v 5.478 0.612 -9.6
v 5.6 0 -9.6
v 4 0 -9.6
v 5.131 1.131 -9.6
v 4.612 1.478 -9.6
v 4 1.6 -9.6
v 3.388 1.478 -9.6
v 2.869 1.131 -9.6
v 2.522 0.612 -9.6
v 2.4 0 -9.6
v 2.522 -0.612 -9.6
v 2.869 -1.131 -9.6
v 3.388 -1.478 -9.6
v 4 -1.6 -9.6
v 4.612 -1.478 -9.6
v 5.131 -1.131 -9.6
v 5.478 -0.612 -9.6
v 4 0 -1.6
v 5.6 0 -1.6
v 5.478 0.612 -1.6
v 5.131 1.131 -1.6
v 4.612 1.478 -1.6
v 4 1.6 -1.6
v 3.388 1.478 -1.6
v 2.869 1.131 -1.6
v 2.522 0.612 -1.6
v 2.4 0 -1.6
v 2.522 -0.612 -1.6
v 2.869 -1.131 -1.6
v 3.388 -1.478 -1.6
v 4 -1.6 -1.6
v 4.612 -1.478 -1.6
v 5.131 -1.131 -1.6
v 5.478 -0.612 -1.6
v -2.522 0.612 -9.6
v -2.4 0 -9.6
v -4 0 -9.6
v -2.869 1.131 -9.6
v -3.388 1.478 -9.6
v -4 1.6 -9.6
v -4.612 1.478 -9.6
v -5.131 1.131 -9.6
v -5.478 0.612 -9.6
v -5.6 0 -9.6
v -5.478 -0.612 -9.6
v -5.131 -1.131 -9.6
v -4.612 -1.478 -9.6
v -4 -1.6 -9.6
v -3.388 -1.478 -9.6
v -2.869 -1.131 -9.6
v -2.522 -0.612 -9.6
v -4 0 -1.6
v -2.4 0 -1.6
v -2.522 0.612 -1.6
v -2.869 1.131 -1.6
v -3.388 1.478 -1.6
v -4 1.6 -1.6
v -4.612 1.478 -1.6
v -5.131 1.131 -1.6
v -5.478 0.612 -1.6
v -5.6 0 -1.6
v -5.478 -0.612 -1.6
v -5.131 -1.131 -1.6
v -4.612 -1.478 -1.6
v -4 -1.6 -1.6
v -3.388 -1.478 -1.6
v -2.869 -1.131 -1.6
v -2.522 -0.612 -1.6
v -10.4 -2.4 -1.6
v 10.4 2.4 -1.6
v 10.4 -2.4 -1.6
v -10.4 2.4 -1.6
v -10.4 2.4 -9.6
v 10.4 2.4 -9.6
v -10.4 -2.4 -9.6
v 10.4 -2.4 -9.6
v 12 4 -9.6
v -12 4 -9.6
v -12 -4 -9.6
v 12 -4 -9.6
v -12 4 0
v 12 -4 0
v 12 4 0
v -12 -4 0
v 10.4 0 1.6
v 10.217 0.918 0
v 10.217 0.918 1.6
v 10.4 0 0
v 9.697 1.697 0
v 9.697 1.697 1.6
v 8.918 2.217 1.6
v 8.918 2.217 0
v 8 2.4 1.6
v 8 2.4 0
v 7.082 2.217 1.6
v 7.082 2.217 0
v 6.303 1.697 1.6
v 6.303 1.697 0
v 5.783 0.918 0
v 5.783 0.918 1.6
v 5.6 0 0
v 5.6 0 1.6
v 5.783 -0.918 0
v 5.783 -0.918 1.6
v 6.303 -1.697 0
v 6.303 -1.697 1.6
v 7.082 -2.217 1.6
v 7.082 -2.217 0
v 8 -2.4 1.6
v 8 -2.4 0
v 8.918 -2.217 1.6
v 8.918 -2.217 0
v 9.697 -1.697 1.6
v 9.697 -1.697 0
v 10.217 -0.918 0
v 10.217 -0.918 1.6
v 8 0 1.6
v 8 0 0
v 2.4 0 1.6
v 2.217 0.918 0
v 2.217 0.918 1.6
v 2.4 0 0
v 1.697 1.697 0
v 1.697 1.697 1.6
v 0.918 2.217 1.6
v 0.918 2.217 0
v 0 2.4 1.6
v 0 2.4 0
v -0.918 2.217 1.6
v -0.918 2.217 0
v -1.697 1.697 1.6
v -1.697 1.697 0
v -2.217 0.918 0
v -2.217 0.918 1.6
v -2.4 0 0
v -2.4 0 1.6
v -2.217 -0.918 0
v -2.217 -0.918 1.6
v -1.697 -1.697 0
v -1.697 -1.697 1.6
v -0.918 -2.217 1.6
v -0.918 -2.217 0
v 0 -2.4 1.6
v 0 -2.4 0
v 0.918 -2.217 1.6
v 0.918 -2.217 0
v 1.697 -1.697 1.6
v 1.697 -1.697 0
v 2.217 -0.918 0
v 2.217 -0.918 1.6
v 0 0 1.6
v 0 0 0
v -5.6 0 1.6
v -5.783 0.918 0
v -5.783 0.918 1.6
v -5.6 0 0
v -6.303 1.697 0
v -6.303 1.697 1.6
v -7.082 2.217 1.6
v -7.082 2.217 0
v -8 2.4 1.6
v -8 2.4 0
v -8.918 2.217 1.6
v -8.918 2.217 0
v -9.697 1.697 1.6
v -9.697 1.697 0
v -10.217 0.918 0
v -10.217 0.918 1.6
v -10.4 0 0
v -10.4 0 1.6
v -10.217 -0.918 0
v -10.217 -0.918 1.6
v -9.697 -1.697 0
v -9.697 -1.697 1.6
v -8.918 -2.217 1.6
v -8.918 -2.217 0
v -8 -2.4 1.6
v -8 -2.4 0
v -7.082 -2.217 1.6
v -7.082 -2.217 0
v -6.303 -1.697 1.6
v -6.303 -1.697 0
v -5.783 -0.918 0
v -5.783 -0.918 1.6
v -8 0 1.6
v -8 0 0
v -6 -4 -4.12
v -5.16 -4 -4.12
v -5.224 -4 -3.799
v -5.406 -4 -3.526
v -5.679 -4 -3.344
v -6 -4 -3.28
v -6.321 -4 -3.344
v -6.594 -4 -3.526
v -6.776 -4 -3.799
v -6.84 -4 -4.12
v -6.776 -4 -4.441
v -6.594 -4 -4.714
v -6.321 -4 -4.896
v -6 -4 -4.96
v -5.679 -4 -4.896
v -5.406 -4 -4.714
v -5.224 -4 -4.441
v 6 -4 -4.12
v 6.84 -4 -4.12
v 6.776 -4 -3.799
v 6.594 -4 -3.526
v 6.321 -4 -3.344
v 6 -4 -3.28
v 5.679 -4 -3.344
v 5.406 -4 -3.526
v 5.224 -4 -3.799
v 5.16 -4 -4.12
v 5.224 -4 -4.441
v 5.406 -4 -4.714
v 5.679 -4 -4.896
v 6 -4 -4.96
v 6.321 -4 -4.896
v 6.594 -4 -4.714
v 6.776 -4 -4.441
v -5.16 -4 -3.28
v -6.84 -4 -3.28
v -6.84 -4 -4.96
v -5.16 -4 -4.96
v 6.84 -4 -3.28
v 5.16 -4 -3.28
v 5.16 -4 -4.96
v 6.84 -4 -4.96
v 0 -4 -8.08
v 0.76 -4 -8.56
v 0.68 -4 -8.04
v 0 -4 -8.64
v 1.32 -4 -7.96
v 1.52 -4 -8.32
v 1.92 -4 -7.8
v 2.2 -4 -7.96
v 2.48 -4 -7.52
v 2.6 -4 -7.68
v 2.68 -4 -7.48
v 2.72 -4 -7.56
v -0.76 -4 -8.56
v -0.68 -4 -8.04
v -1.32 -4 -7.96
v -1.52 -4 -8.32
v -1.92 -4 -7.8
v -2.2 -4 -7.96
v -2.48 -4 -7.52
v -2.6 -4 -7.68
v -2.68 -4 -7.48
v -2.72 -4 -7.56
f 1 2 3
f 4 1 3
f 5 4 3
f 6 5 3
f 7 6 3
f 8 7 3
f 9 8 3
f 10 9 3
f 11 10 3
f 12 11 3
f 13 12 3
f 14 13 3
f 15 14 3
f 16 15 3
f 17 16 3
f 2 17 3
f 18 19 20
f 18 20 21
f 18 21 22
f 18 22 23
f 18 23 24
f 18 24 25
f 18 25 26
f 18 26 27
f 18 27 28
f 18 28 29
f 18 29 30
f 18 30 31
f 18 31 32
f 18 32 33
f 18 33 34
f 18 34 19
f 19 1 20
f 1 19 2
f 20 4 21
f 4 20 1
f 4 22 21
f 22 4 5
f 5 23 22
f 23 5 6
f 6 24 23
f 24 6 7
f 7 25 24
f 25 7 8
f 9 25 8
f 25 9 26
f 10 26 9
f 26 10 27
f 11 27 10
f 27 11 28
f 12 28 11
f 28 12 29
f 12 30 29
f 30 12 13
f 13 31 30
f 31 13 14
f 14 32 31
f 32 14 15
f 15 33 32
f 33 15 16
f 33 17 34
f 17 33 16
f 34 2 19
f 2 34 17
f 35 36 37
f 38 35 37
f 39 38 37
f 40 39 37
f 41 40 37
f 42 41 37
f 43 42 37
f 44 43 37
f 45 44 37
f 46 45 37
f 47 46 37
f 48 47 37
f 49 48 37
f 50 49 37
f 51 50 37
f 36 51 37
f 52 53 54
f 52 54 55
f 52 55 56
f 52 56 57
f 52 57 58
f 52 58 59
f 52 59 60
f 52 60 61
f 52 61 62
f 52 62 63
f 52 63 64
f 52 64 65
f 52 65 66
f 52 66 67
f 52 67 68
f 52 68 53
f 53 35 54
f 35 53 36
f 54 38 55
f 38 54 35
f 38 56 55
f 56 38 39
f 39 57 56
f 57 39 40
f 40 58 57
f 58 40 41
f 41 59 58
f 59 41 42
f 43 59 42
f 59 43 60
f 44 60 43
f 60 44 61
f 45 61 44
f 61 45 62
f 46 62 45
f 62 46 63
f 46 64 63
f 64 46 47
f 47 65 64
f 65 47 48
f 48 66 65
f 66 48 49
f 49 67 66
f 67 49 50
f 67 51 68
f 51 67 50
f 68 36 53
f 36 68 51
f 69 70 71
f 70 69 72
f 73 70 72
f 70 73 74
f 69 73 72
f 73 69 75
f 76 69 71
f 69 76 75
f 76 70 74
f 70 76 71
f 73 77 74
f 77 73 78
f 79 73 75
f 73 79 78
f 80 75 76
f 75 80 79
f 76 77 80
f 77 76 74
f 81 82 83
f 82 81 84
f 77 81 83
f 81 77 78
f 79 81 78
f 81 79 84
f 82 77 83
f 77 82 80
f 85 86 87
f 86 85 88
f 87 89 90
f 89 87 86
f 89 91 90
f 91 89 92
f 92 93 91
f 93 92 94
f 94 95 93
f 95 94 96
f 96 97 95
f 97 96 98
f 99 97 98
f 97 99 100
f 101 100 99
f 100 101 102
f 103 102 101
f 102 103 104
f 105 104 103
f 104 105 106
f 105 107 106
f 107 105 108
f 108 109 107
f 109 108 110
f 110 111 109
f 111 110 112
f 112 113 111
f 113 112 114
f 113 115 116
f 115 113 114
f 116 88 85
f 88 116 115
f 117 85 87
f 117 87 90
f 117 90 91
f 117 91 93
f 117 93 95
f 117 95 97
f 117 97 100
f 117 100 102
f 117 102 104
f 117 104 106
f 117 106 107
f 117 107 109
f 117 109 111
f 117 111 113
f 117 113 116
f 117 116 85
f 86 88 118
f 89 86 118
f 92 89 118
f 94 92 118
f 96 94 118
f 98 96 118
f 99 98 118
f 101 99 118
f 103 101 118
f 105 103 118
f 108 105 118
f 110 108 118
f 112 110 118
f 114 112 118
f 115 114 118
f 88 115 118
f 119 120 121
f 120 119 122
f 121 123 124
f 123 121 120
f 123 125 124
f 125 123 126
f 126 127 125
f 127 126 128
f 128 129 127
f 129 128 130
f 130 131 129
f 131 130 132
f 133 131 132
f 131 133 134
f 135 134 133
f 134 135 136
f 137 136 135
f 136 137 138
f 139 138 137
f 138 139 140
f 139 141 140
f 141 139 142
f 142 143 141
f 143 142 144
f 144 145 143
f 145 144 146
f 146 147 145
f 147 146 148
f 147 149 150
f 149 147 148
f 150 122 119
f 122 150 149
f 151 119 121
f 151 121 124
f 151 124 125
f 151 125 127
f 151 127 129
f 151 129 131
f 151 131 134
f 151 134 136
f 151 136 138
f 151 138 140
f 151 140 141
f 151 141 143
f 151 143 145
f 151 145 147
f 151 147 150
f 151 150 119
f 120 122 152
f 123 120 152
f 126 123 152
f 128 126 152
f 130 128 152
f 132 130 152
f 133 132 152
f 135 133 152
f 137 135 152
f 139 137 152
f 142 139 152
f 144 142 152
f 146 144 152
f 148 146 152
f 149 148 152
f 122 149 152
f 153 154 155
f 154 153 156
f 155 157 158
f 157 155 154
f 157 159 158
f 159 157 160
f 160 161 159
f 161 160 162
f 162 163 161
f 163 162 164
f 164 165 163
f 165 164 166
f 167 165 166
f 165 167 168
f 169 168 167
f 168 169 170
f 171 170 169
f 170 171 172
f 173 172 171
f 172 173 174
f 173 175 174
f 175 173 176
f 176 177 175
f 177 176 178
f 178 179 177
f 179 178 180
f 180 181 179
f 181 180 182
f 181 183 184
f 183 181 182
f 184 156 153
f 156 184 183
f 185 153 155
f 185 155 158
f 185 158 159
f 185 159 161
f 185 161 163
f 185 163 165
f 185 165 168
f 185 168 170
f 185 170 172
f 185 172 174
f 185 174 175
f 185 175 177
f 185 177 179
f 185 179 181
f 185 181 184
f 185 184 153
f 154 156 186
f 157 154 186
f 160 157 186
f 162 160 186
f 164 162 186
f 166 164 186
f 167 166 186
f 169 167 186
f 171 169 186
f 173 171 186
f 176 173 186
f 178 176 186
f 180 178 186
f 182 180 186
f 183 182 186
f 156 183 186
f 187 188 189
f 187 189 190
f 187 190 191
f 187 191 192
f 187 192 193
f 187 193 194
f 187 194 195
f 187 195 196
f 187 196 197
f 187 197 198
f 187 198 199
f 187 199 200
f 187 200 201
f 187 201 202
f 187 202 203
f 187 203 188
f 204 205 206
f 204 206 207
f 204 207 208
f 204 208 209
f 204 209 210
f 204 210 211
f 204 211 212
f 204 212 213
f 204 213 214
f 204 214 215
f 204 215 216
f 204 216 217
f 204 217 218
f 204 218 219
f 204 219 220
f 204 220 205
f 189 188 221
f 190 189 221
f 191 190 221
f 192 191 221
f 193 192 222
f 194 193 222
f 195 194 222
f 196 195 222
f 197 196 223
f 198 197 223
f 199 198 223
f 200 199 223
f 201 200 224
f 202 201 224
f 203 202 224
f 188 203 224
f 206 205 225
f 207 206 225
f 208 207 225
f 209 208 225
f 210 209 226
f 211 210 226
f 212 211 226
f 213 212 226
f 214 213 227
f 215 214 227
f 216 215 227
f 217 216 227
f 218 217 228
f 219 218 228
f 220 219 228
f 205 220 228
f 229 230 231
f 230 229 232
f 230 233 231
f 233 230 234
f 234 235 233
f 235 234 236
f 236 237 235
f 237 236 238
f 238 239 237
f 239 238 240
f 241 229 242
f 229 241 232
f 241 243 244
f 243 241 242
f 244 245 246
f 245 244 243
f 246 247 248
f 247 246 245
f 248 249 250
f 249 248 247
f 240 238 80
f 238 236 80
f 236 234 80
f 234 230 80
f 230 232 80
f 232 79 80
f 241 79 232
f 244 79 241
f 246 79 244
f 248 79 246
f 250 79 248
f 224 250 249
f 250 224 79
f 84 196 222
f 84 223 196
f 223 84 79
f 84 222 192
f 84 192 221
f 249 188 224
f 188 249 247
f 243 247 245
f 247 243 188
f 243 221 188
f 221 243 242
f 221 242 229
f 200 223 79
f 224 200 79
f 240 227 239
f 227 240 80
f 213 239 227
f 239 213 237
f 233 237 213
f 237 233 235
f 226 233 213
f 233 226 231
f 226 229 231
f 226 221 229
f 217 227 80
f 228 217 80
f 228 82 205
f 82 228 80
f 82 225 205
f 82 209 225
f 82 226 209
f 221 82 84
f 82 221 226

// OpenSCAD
// file: ../p/4-4edge.scad
use <../lib.scad>
function ldraw_lib__4_4edge() = [
// 0 Circle 1.0
// 0 Name: 4-4edge.dat
// 0 Author: James Jessiman
// 0 !LDRAW_ORG Primitive UPDATE 2017-01
// 0 !LICENSE Licensed under CC BY 2.0 and CC BY 4.0 : see CAreadme.txt
// 
// 0 BFC CERTIFY CCW
  [0,"BFC","CERTIFY"],
  [0,"BFC","CCW"],
// 
// 0 !HISTORY 1998-12-15 [PTadmin] Official Update 1998-10
// 0 !HISTORY 2005-12-28 [PTadmin] Official Update 2005-01
// 0 !HISTORY 2007-06-24 [PTadmin] Header formatted for Contributor Agreement
// 0 !HISTORY 2008-07-01 [PTadmin] Official Update 2008-01
// 0 !HISTORY 2017-01-15 [Steffen] BFCed
// 0 !HISTORY 2017-12-30 [PTadmin] Official Update 2017-01
// 
// 
// 2 24 1 0 0 0.9239 0 0.3827
  [2,24,1,0,0,0.9239,0,0.3827],
// 2 24 0.9239 0 0.3827 0.7071 0 0.7071
  [2,24,0.9239,0,0.3827,0.7071,0,0.7071],
// 2 24 0.7071 0 0.7071 0.3827 0 0.9239
  [2,24,0.7071,0,0.7071,0.3827,0,0.9239],
// 2 24 0.3827 0 0.9239 0 0 1
  [2,24,0.3827,0,0.9239,0,0,1],
// 2 24 0 0 1 -0.3827 0 0.9239
  [2,24,0,0,1,-0.3827,0,0.9239],
// 2 24 -0.3827 0 0.9239 -0.7071 0 0.7071
  [2,24,-0.3827,0,0.9239,-0.7071,0,0.7071],
// 2 24 -0.7071 0 0.7071 -0.9239 0 0.3827
  [2,24,-0.7071,0,0.7071,-0.9239,0,0.3827],
// 2 24 -0.9239 0 0.3827 -1 0 -0
  [2,24,-0.9239,0,0.3827,-1,0,-0],
// 2 24 -1 0 -0 -0.9239 0 -0.3827
  [2,24,-1,0,-0,-0.9239,0,-0.3827],
// 2 24 -0.9239 0 -0.3827 -0.7071 0 -0.7071
  [2,24,-0.9239,0,-0.3827,-0.7071,0,-0.7071],
// 2 24 -0.7071 0 -0.7071 -0.3827 0 -0.9239
  [2,24,-0.7071,0,-0.7071,-0.3827,0,-0.9239],
// 2 24 -0.3827 0 -0.9239 0 0 -1
  [2,24,-0.3827,0,-0.9239,0,0,-1],
// 2 24 0 0 -1 0.3827 0 -0.9239
  [2,24,0,0,-1,0.3827,0,-0.9239],
// 2 24 0.3827 0 -0.9239 0.7071 0 -0.7071
  [2,24,0.3827,0,-0.9239,0.7071,0,-0.7071],
// 2 24 0.7071 0 -0.7071 0.9239 0 -0.3827
  [2,24,0.7071,0,-0.7071,0.9239,0,-0.3827],
// 2 24 0.9239 0 -0.3827 1 0 0
  [2,24,0.9239,0,-0.3827,1,0,0],
];
module ldraw_lib__4_4edge(step=0, col=false, unit=2/5, alt=false, line=0.2, solid=!$preview)
    makepoly(ldraw_lib__4_4edge(), step=step, col=col, unit=unit, alt=alt, line=line, solid=solid);
ldraw_lib__4_4edge(line=0.2);
// file: ../p/4-4cyli.scad
use <../lib.scad>
$fa=1; $fs=0.2;
function ldraw_lib__4_4cyli(realsolid=false) = [
// 0 Cylinder 1.0
// 0 Name: 4-4cyli.dat
// 0 Author: James Jessiman
// 0 !LDRAW_ORG Primitive UPDATE 2005-01
// 0 !LICENSE Licensed under CC BY 2.0 and CC BY 4.0 : see CAreadme.txt
// 
// 0 BFC CERTIFY CCW
  [0,"BFC","CERTIFY"],
  [0,"BFC","CCW"],
// 
// 0 !HISTORY 1998-12-15 [PTadmin] Official Update 1998-10
// 0 !HISTORY 2002-03-23 [sbliss] Added BFC statement; merged headers from files in distributions LDraw 0.27 and Complete.
// 0 !HISTORY 2002-04-25 [PTadmin] Official Update 2002-02
// 0 !HISTORY 2004-12-14 [guyvivan] BFC CCW
// 0 !HISTORY 2005-12-28 [PTadmin] Official Update 2005-01
// 0 !HISTORY 2007-06-24 [PTadmin] Header formatted for Contributor Agreement
// 0 !HISTORY 2008-07-01 [PTadmin] Official Update 2008-01
// 
// 
// 4 16 1 1 0 0.9239 1 0.3827 0.9239 0 0.3827 1 0 0
  [4,16,1,1,0,0.9239,1,0.3827,0.9239,0,0.3827,1,0,0],
// 5 24 1 0 0 1 1 0 0.9239 0 0.3827 0.9239 0 -0.3827
  [5,24,1,0,0,1,1,0,0.9239,0,0.3827,0.9239,0,-0.3827],
// 4 16 0.9239 1 0.3827 0.7071 1 0.7071 0.7071 0 0.7071 0.9239 0 0.3827
  [4,16,0.9239,1,0.3827,0.7071,1,0.7071,0.7071,0,0.7071,0.9239,0,0.3827],
// 5 24 0.9239 0 0.3827 0.9239 1 0.3827 0.7071 0 0.7071 1 0 0
  [5,24,0.9239,0,0.3827,0.9239,1,0.3827,0.7071,0,0.7071,1,0,0],
// 4 16 0.7071 1 0.7071 0.3827 1 0.9239 0.3827 0 0.9239 0.7071 0 0.7071
  [4,16,0.7071,1,0.7071,0.3827,1,0.9239,0.3827,0,0.9239,0.7071,0,0.7071],
// 5 24 0.7071 0 0.7071 0.7071 1 0.7071 0.3827 0 0.9239 0.9239 0 0.3827
  [5,24,0.7071,0,0.7071,0.7071,1,0.7071,0.3827,0,0.9239,0.9239,0,0.3827],
// 4 16 0.3827 1 0.9239 0 1 1 0 0 1 0.3827 0 0.9239
  [4,16,0.3827,1,0.9239,0,1,1,0,0,1,0.3827,0,0.9239],
// 5 24 0.3827 0 0.9239 0.3827 1 0.9239 0 0 1 0.7071 0 0.7071
  [5,24,0.3827,0,0.9239,0.3827,1,0.9239,0,0,1,0.7071,0,0.7071],
// 4 16 0 1 1 -0.3827 1 0.9239 -0.3827 0 0.9239 0 0 1
  [4,16,0,1,1,-0.3827,1,0.9239,-0.3827,0,0.9239,0,0,1],
// 5 24 0 0 1 0 1 1 -0.3827 0 0.9239 0.3827 0 0.9239
  [5,24,0,0,1,0,1,1,-0.3827,0,0.9239,0.3827,0,0.9239],
// 4 16 -0.3827 1 0.9239 -0.7071 1 0.7071 -0.7071 0 0.7071 -0.3827 0 0.9239
  [4,16,-0.3827,1,0.9239,-0.7071,1,0.7071,-0.7071,0,0.7071,-0.3827,0,0.9239],
// 5 24 -0.3827 0 0.9239 -0.3827 1 0.9239 -0.7071 0 0.7071 0 0 1
  [5,24,-0.3827,0,0.9239,-0.3827,1,0.9239,-0.7071,0,0.7071,0,0,1],
// 4 16 -0.7071 1 0.7071 -0.9239 1 0.3827 -0.9239 0 0.3827 -0.7071 0 0.7071
  [4,16,-0.7071,1,0.7071,-0.9239,1,0.3827,-0.9239,0,0.3827,-0.7071,0,0.7071],
// 5 24 -0.7071 0 0.7071 -0.7071 1 0.7071 -0.9239 0 0.3827 -0.3827 0 0.9239
  [5,24,-0.7071,0,0.7071,-0.7071,1,0.7071,-0.9239,0,0.3827,-0.3827,0,0.9239],
// 4 16 -0.9239 1 0.3827 -1 1 0 -1 0 0 -0.9239 0 0.3827
  [4,16,-0.9239,1,0.3827,-1,1,0,-1,0,0,-0.9239,0,0.3827],
// 5 24 -0.9239 0 0.3827 -0.9239 1 0.3827 -1 0 0 -0.7071 0 0.7071
  [5,24,-0.9239,0,0.3827,-0.9239,1,0.3827,-1,0,0,-0.7071,0,0.7071],
// 4 16 -1 1 0 -0.9239 1 -0.3827 -0.9239 0 -0.3827 -1 0 0
  [4,16,-1,1,0,-0.9239,1,-0.3827,-0.9239,0,-0.3827,-1,0,0],
// 5 24 -1 0 0 -1 1 0 -0.9239 0 -0.3827 -0.9239 0 0.3827
  [5,24,-1,0,0,-1,1,0,-0.9239,0,-0.3827,-0.9239,0,0.3827],
// 4 16 -0.9239 1 -0.3827 -0.7071 1 -0.7071 -0.7071 0 -0.7071 -0.9239 0 -0.3827
  [4,16,-0.9239,1,-0.3827,-0.7071,1,-0.7071,-0.7071,0,-0.7071,-0.9239,0,-0.3827],
// 5 24 -0.9239 0 -0.3827 -0.9239 1 -0.3827 -0.7071 0 -0.7071 -1 0 0
  [5,24,-0.9239,0,-0.3827,-0.9239,1,-0.3827,-0.7071,0,-0.7071,-1,0,0],
// 4 16 -0.7071 1 -0.7071 -0.3827 1 -0.9239 -0.3827 0 -0.9239 -0.7071 0 -0.7071
  [4,16,-0.7071,1,-0.7071,-0.3827,1,-0.9239,-0.3827,0,-0.9239,-0.7071,0,-0.7071],
// 5 24 -0.7071 0 -0.7071 -0.7071 1 -0.7071 -0.3827 0 -0.9239 -0.9239 0 -0.3827
  [5,24,-0.7071,0,-0.7071,-0.7071,1,-0.7071,-0.3827,0,-0.9239,-0.9239,0,-0.3827],
// 4 16 -0.3827 1 -0.9239 0 1 -1 0 0 -1 -0.3827 0 -0.9239
  [4,16,-0.3827,1,-0.9239,0,1,-1,0,0,-1,-0.3827,0,-0.9239],
// 5 24 -0.3827 0 -0.9239 -0.3827 1 -0.9239 0 0 -1 -0.7071 0 -0.7071
  [5,24,-0.3827,0,-0.9239,-0.3827,1,-0.9239,0,0,-1,-0.7071,0,-0.7071],
// 4 16 0 1 -1 0.3827 1 -0.9239 0.3827 0 -0.9239 0 0 -1
  [4,16,0,1,-1,0.3827,1,-0.9239,0.3827,0,-0.9239,0,0,-1],
// 5 24 0 0 -1 0 1 -1 0.3827 0 -0.9239 -0.3827 0 -0.9239
  [5,24,0,0,-1,0,1,-1,0.3827,0,-0.9239,-0.3827,0,-0.9239],
// 4 16 0.3827 1 -0.9239 0.7071 1 -0.7071 0.7071 0 -0.7071 0.3827 0 -0.9239
  [4,16,0.3827,1,-0.9239,0.7071,1,-0.7071,0.7071,0,-0.7071,0.3827,0,-0.9239],
// 5 24 0.3827 0 -0.9239 0.3827 1 -0.9239 0.7071 0 -0.7071 0 0 -1
  [5,24,0.3827,0,-0.9239,0.3827,1,-0.9239,0.7071,0,-0.7071,0,0,-1],
// 4 16 0.7071 1 -0.7071 0.9239 1 -0.3827 0.9239 0 -0.3827 0.7071 0 -0.7071
  [4,16,0.7071,1,-0.7071,0.9239,1,-0.3827,0.9239,0,-0.3827,0.7071,0,-0.7071],
// 5 24 0.7071 0 -0.7071 0.7071 1 -0.7071 0.9239 0 -0.3827 0.3827 0 -0.9239
  [5,24,0.7071,0,-0.7071,0.7071,1,-0.7071,0.9239,0,-0.3827,0.3827,0,-0.9239],
// 4 16 0.9239 1 -0.3827 1 1 0 1 0 0 0.9239 0 -0.3827
  [4,16,0.9239,1,-0.3827,1,1,0,1,0,0,0.9239,0,-0.3827],
// 5 24 0.9239 0 -0.3827 0.9239 1 -0.3827 1 0 0 0.7071 0 -0.7071
  [5,24,0.9239,0,-0.3827,0.9239,1,-0.3827,1,0,0,0.7071,0,-0.7071],
// 0
];
module ldraw_lib__4_4cyli(step=0, col=false, unit=2/5, alt=false, line=0.2, solid=!$preview)
    makepoly(ldraw_lib__4_4cyli(solid), step=step, col=col, unit=unit, alt=alt, line=line, solid=solid);
ldraw_lib__4_4cyli(line=0.2);
// file: ../p/stud3.scad
use <../lib.scad>
use <4-4cyli.scad>
use <4-4disc.scad>
use <4-4edge.scad>
function ldraw_lib__stud3() = [
// 0 Stud Tube Solid
// 0 Name: stud3.dat
// 0 Author: James Jessiman
// 0 !LDRAW_ORG Primitive UPDATE 2012-01
// 0 !LICENSE Licensed under CC BY 4.0 : see CAreadme.txt
// 
// 0 BFC CERTIFY CCW
  [0,"BFC","CERTIFY"],
  [0,"BFC","CCW"],
// 
// 0 !HISTORY 2002-04-04 [sbliss] Modified for BFC compliance
// 0 !HISTORY 2002-04-25 [PTadmin] Official Update 2002-02
// 0 !HISTORY 2007-06-24 [PTadmin] Header formatted for Contributor Agreement
// 0 !HISTORY 2008-07-01 [PTadmin] Official Update 2008-01
// 0 !HISTORY 2012-02-16 [Philo] Changed to CCW
// 0 !HISTORY 2012-03-30 [PTadmin] Official Update 2012-01
// 
// 
// 1 16 0 -4 0 4 0 0 0 1 0 0 0 4 4-4edge.dat
  [1,16,0,-4,0,4,0,0,0,1,0,0,0,4, ldraw_lib__4_4edge()],
// 1 16 0 0 0 4 0 0 0 1 0 0 0 4 4-4edge.dat
  [1,16,0,0,0,4,0,0,0,1,0,0,0,4, ldraw_lib__4_4edge()],
// 1 16 0 -4 0 4 0 0 0 1 0 0 0 4 4-4disc.dat
  [1,16,0,-4,0,4,0,0,0,1,0,0,0,4, ldraw_lib__4_4disc()],
  [-1,16,0,0,0,4,0,0,0,-1,0,0,0,4, ldraw_lib__4_4disc()],
// 1 16 0 -4 0 4 0 0 0 4 0 0 0 4 4-4cyli.dat
  [1,16,0,-4,0,4,0,0,0,4,0,0,0,4, ldraw_lib__4_4cyli()],
];
module ldraw_lib__stud3(step=0, col=false, unit=2/5, alt=false, line=0.2, solid=!$preview)
    makepoly(ldraw_lib__stud3(), step=step, col=col, unit=unit, alt=alt, line=line, solid=solid);
ldraw_lib__stud3(line=0.2);
// file: ../p/stud.scad
use <../lib.scad>
use <4-4cyli.scad>
use <4-4disc.scad>
use <4-4edge.scad>
function ldraw_lib__stud() = [
// 0 Stud
// 0 Name: stud.dat
// 0 Author: James Jessiman
// 0 !LDRAW_ORG Primitive UPDATE 2012-01
// 0 !LICENSE Licensed under CC BY 4.0 : see CAreadme.txt
// 
// 0 BFC CERTIFY CCW
  [0,"BFC","CERTIFY"],
  [0,"BFC","CCW"],
// 
// 0 !HISTORY 2002-04-04 [sbliss] Modified for BFC compliance
// 0 !HISTORY 2002-04-25 [PTadmin] Official Update 2002-02
// 0 !HISTORY 2007-06-24 [PTadmin] Header formatted for Contributor Agreement
// 0 !HISTORY 2008-07-01 [PTadmin] Official Update 2008-01
// 0 !HISTORY 2012-02-16 [Philo] Changed to CCW
// 0 !HISTORY 2012-03-30 [PTadmin] Official Update 2012-01
// 
// 
// 1 16 0 0 0 6 0 0 0 1 0 0 0 6 4-4edge.dat
  [1,16,0,0,0,6,0,0,0,1,0,0,0,6, ldraw_lib__4_4edge()],
// 1 16 0 -4 0 6 0 0 0 1 0 0 0 6 4-4edge.dat
  [1,16,0,-4,0,6,0,0,0,1,0,0,0,6, ldraw_lib__4_4edge()],
// 1 16 0 0 0 6 0 0 0 -4 0 0 0 6 4-4cyli.dat
  [1,16,0,0,0,6,0,0,0,-4,0,0,0,6, ldraw_lib__4_4cyli()],
// 1 16 0 -4 0 6 0 0 0 1 0 0 0 6 4-4disc.dat
  [1,16,0,-4,0,6,0,0,0,1,0,0,0,6, ldraw_lib__4_4disc()],
  [-1,16,0,0,0,6,0,0,0,-1,0,0,0,6, ldraw_lib__4_4disc()],
];
module ldraw_lib__stud(step=0, col=false, unit=2/5, alt=false, line=0.2, solid=!$preview)
    makepoly(ldraw_lib__stud(), step=step, col=col, unit=unit, alt=alt, line=line, solid=solid);
ldraw_lib__stud(line=0.2);
// file: ../p/box5.scad
use <../lib.scad>
function ldraw_lib__box5() = [
// 0 Box with 5 Faces and All Edges
// 0 Name: box5.dat
// 0 Author: James Jessiman
// 0 !LDRAW_ORG Primitive UPDATE 2012-01
// 0 !LICENSE Licensed under CC BY 2.0 and CC BY 4.0 : see CAreadme.txt
// 
// 0 BFC CERTIFY CCW
  [0,"BFC","CERTIFY"],
  [0,"BFC","CCW"],
// 
// 0 !HISTORY 2002-04-03 [sbliss] Modified for BFC compliance
// 0 !HISTORY 2002-04-25 [PTadmin] Official Update 2002-02
// 0 !HISTORY 2007-06-24 [PTadmin] Header formatted for Contributor Agreement
// 0 !HISTORY 2008-07-01 [PTadmin] Official Update 2008-01
// 0 !HISTORY 2012-02-16 [Philo] Changed to CCW
// 0 !HISTORY 2012-03-30 [PTadmin] Official Update 2012-01
// 
// 
// 2 24 1 1 1 -1 1 1
  [2,24,1,1,1,-1,1,1],
// 2 24 -1 1 1 -1 1 -1
  [2,24,-1,1,1,-1,1,-1],
// 2 24 -1 1 -1 1 1 -1
  [2,24,-1,1,-1,1,1,-1],
// 2 24 1 1 -1 1 1 1
  [2,24,1,1,-1,1,1,1],
// 2 24 1 0 1 -1 0 1
  [2,24,1,0,1,-1,0,1],
// 2 24 -1 0 1 -1 0 -1
  [2,24,-1,0,1,-1,0,-1],
// 2 24 -1 0 -1 1 0 -1
  [2,24,-1,0,-1,1,0,-1],
// 2 24 1 0 -1 1 0 1
  [2,24,1,0,-1,1,0,1],
// 2 24 1 0 1 1 1 1
  [2,24,1,0,1,1,1,1],
// 2 24 -1 0 1 -1 1 1
  [2,24,-1,0,1,-1,1,1],
// 2 24 1 0 -1 1 1 -1
  [2,24,1,0,-1,1,1,-1],
// 2 24 -1 0 -1 -1 1 -1
  [2,24,-1,0,-1,-1,1,-1],
// 4 16 -1 1 1 1 1 1 1 1 -1 -1 1 -1
  [4,16,-1,1,1,1,1,1,1,1,-1,-1,1,-1],
// 4 16 -1 1 1 -1 0 1 1 0 1 1 1 1
  [4,16,-1,1,1,-1,0,1,1,0,1,1,1,1],
// 4 16 -1 1 -1 -1 0 -1 -1 0 1 -1 1 1
  [4,16,-1,1,-1,-1,0,-1,-1,0,1,-1,1,1],
// 4 16 1 1 -1 1 0 -1 -1 0 -1 -1 1 -1
  [4,16,1,1,-1,1,0,-1,-1,0,-1,-1,1,-1],
// 4 16 1 1 1 1 0 1 1 0 -1 1 1 -1
  [4,16,1,1,1,1,0,1,1,0,-1,1,1,-1],
];
makepoly(ldraw_lib__box5(), line=0.2);
// file: ../p/box4t.scad
use <../lib.scad>
function ldraw_lib__box4t() = [
// 0 Box with 4 Adjacent Faces and All Edges
// 0 Name: box4t.dat
// 0 Author: Tore Eriksson [Tore_Eriksson]
// 0 !LDRAW_ORG Primitive UPDATE 2003-02
// 0 !LICENSE Licensed under CC BY 2.0 and CC BY 4.0 : see CAreadme.txt
// 
// 0 BFC CERTIFY CCW
  [0,"BFC","CERTIFY"],
  [0,"BFC","CCW"],
// 
// 0 !HISTORY 1997-09-29 [PTadmin] Official Update 1997-15
// 0 !HISTORY 2002-08-31 [izanette] Modified with WINDZ for BFC compliance
// 0 !HISTORY 2003-08-01 [PTadmin] Official Update 2003-02
// 0 !HISTORY 2007-06-24 [PTadmin] Header formatted for Contributor Agreement
// 0 !HISTORY 2008-07-01 [PTadmin] Official Update 2008-01
// 
// 
// 2 24 1 1 1 -1 1 1
  [2,24,1,1,1,-1,1,1],
// 2 24 -1 1 1 -1 1 -1
  [2,24,-1,1,1,-1,1,-1],
// 2 24 -1 1 -1 1 1 -1
  [2,24,-1,1,-1,1,1,-1],
// 2 24 1 1 -1 1 1 1
  [2,24,1,1,-1,1,1,1],
// 2 24 1 0 1 -1 0 1
  [2,24,1,0,1,-1,0,1],
// 2 24 -1 0 1 -1 0 -1
  [2,24,-1,0,1,-1,0,-1],
// 2 24 -1 0 -1 1 0 -1
  [2,24,-1,0,-1,1,0,-1],
// 2 24 1 0 -1 1 0 1
  [2,24,1,0,-1,1,0,1],
// 2 24 1 0 1 1 1 1
  [2,24,1,0,1,1,1,1],
// 2 24 -1 0 1 -1 1 1
  [2,24,-1,0,1,-1,1,1],
// 2 24 1 0 -1 1 1 -1
  [2,24,1,0,-1,1,1,-1],
// 2 24 -1 0 -1 -1 1 -1
  [2,24,-1,0,-1,-1,1,-1],
// 4 16 1 1 1 1 1 -1 -1 1 -1 -1 1 1
  [4,16,1,1,1,1,1,-1,-1,1,-1,-1,1,1],
// 4 16 1 1 1 -1 1 1 -1 0 1 1 0 1
  [4,16,1,1,1,-1,1,1,-1,0,1,1,0,1],
// 4 16 -1 1 1 -1 1 -1 -1 0 -1 -1 0 1
  [4,16,-1,1,1,-1,1,-1,-1,0,-1,-1,0,1],
// 0 4 16 -1 1 -1 -1 0 -1 1 0 -1 1 1 -1
// 4 16 1 1 -1 1 1 1 1 0 1 1 0 -1
  [4,16,1,1,-1,1,1,1,1,0,1,1,0,-1],
// 0
];
makepoly(ldraw_lib__box4t(), line=0.2);
// file: s/3622s01.scad
use <../../lib.scad>
use <../../p/box4t.scad>
use <../../p/box5.scad>
use <../../p/stud.scad>
use <../../p/stud3.scad>
function ldraw_lib__s__3622s01() = [
// 0 ~Brick  1 x  3 without Front Face
// 0 Name: s\3622s01.dat
// 0 Author: Andy Westrate [westrate]
// 0 !LDRAW_ORG Subpart UPDATE 2004-02
// 0 !LICENSE Licensed under CC BY 2.0 and CC BY 4.0 : see CAreadme.txt
// 
// 0 BFC CERTIFY CCW
  [0,"BFC","CERTIFY"],
  [0,"BFC","CCW"],
// 
// 0 !HISTORY 2003-10-14 [westrate] Subfiled, BFC'd
// 0 !HISTORY 2004-04-22 [PTadmin] Official Update 2004-02
// 0 !HISTORY 2007-08-31 [PTadmin] Header formatted for Contributor Agreement
// 0 !HISTORY 2008-07-01 [PTadmin] Official Update 2008-01
// 
// 
// 0 // Uncomment the following for front face
// 0 // 4 16 30 0 -10 -30 0 -10 -30 24 -10 30 24 -10
// 1 16 10 4 0 1 0 0 0 -5 0 0 0 1 stud3.dat
  [1,16,10,4,0,1,0,0,0,-5,0,0,0,1, ldraw_lib__stud3()],
// 1 16 -10 4 0 1 0 0 0 -5 0 0 0 1 stud3.dat
  [1,16,-10,4,0,1,0,0,0,-5,0,0,0,1, ldraw_lib__stud3()],
// 
// 0 BFC INVERTNEXT
  [0,"BFC","INVERTNEXT"],
// 1 16 0 24 0 26 0 0 0 -20 0 0 0 6 box5.dat
  [1,16,0,24,0,26,0,0,0,-20,0,0,0,6, ldraw_lib__box5()],
// 
// 4 16 30 24 10 26 24 6 -26 24 6 -30 24 10
  [4,16,30,24,10,26,24,6,-26,24,6,-30,24,10],
// 4 16 -30 24 10 -26 24 6 -26 24 -6 -30 24 -10
  [4,16,-30,24,10,-26,24,6,-26,24,-6,-30,24,-10],
// 4 16 -30 24 -10 -26 24 -6 26 24 -6 30 24 -10
  [4,16,-30,24,-10,-26,24,-6,26,24,-6,30,24,-10],
// 4 16 30 24 -10 26 24 -6 26 24 6 30 24 10
  [4,16,30,24,-10,26,24,-6,26,24,6,30,24,10],
// 
// 1 16 0 24 0 30 0 0 0 -24 0 0 0 10 box4t.dat
  [1,16,0,24,0,30,0,0,0,-24,0,0,0,10, ldraw_lib__box4t()],
// 
// 1 16 20 0 0 1 0 0 0 1 0 0 0 1 stud.dat
  [1,16,20,0,0,1,0,0,0,1,0,0,0,1, ldraw_lib__stud()],
// 1 16 0 0 0 1 0 0 0 1 0 0 0 1 stud.dat
  [1,16,0,0,0,1,0,0,0,1,0,0,0,1, ldraw_lib__stud()],
// 1 16 -20 0 0 1 0 0 0 1 0 0 0 1 stud.dat
  [1,16,-20,0,0,1,0,0,0,1,0,0,0,1, ldraw_lib__stud()],
// 0
];
makepoly(ldraw_lib__s__3622s01(), line=0.2);
// file: ../p/4-4ndis.scad
use <../lib.scad>
function ldraw_lib__4_4ndis() = [
// 0 Disc Negative 1.0
// 0 Name: 4-4ndis.dat
// 0 Author: James Jessiman
// 0 !LDRAW_ORG Primitive UPDATE 2012-01
// 0 !LICENSE Licensed under CC BY 2.0 and CC BY 4.0 : see CAreadme.txt
// 
// 0 BFC CERTIFY CCW
  [0,"BFC","CERTIFY"],
  [0,"BFC","CCW"],
// 
// 0 !HISTORY 2002-03-23 [sbliss] Added BFC statement; compacted code
// 0 !HISTORY 2002-04-25 [PTadmin] Official Update 2002-02
// 0 !HISTORY 2007-06-24 [PTadmin] Header formatted for Contributor Agreement
// 0 !HISTORY 2008-07-01 [PTadmin] Official Update 2008-01
// 0 !HISTORY 2012-02-16 [Philo] Changed to CCW
// 0 !HISTORY 2012-03-30 [PTadmin] Official Update 2012-01
// 
// 
// 3 16 0.9239 0 0.3827 1 0 0 1 0 1
  [3,16,0.9239,0,0.3827,1,0,0,1,0,1],
// 3 16 0.7071 0 0.7071 0.9239 0 0.3827 1 0 1
  [3,16,0.7071,0,0.7071,0.9239,0,0.3827,1,0,1],
// 3 16 0.3827 0 0.9239 0.7071 0 0.7071 1 0 1
  [3,16,0.3827,0,0.9239,0.7071,0,0.7071,1,0,1],
// 3 16 0 0 1 0.3827 0 0.9239 1 0 1
  [3,16,0,0,1,0.3827,0,0.9239,1,0,1],
// 3 16 -0.3827 0 0.9239 0 0 1 -1 0 1
  [3,16,-0.3827,0,0.9239,0,0,1,-1,0,1],
// 3 16 -0.7071 0 0.7071 -0.3827 0 0.9239 -1 0 1
  [3,16,-0.7071,0,0.7071,-0.3827,0,0.9239,-1,0,1],
// 3 16 -0.9239 0 0.3827 -0.7071 0 0.7071 -1 0 1
  [3,16,-0.9239,0,0.3827,-0.7071,0,0.7071,-1,0,1],
// 3 16 -1 0 0 -0.9239 0 0.3827 -1 0 1
  [3,16,-1,0,0,-0.9239,0,0.3827,-1,0,1],
// 3 16 -0.9239 0 -0.3827 -1 0 0 -1 0 -1
  [3,16,-0.9239,0,-0.3827,-1,0,0,-1,0,-1],
// 3 16 -0.7071 0 -0.7071 -0.9239 0 -0.3827 -1 0 -1
  [3,16,-0.7071,0,-0.7071,-0.9239,0,-0.3827,-1,0,-1],
// 3 16 -0.3827 0 -0.9239 -0.7071 0 -0.7071 -1 0 -1
  [3,16,-0.3827,0,-0.9239,-0.7071,0,-0.7071,-1,0,-1],
// 3 16 0 0 -1 -0.3827 0 -0.9239 -1 0 -1
  [3,16,0,0,-1,-0.3827,0,-0.9239,-1,0,-1],
// 3 16 0.3827 0 -0.9239 0 0 -1 1 0 -1
  [3,16,0.3827,0,-0.9239,0,0,-1,1,0,-1],
// 3 16 0.7071 0 -0.7071 0.3827 0 -0.9239 1 0 -1
  [3,16,0.7071,0,-0.7071,0.3827,0,-0.9239,1,0,-1],
// 3 16 0.9239 0 -0.3827 0.7071 0 -0.7071 1 0 -1
  [3,16,0.9239,0,-0.3827,0.7071,0,-0.7071,1,0,-1],
// 3 16 1 0 0 0.9239 0 -0.3827 1 0 -1
  [3,16,1,0,0,0.9239,0,-0.3827,1,0,-1],
];
module ldraw_lib__4_4ndis(step=0, col=false, unit=2/5, alt=false, line=0.2, solid=!$preview)
    makepoly(ldraw_lib__4_4ndis(), step=step, col=col, unit=unit, alt=alt, line=line, solid=solid);
ldraw_lib__4_4ndis(line=0.2);
// file: ../p/4-4disc.scad
use <../lib.scad>
function ldraw_lib__4_4disc() = [
// 0 Disc 1.0
// 0 Name: 4-4disc.dat
// 0 Author: James Jessiman
// 0 !LDRAW_ORG Primitive UPDATE 2002-02
// 0 !LICENSE Licensed under CC BY 2.0 and CC BY 4.0 : see CAreadme.txt
// 
// 0 BFC CERTIFY CCW
  [0,"BFC","CERTIFY"],
  [0,"BFC","CCW"],
// 
// 0 !HISTORY 1998-12-15 [PTadmin] Official Update 1998-10
// 0 !HISTORY 2002-03-23 [sbliss] Added BFC statement
// 0 !HISTORY 2002-04-25 [PTadmin] Official Update 2002-02
// 0 !HISTORY 2007-06-24 [PTadmin] Header formatted for Contributor Agreement
// 0 !HISTORY 2008-07-01 [PTadmin] Official Update 2008-01
// 
// 
// 3 16 0 0 0 1 0 0 0.9239 0 0.3827
  [3,16,0,0,0,1,0,0,0.9239,0,0.3827],
// 3 16 0 0 0 0.9239 0 0.3827 0.7071 0 0.7071
  [3,16,0,0,0,0.9239,0,0.3827,0.7071,0,0.7071],
// 3 16 0 0 0 0.7071 0 0.7071 0.3827 0 0.9239
  [3,16,0,0,0,0.7071,0,0.7071,0.3827,0,0.9239],
// 3 16 0 0 0 0.3827 0 0.9239 0 0 1
  [3,16,0,0,0,0.3827,0,0.9239,0,0,1],
// 3 16 0 0 0 0 0 1 -0.3827 0 0.9239
  [3,16,0,0,0,0,0,1,-0.3827,0,0.9239],
// 3 16 0 0 0 -0.3827 0 0.9239 -0.7071 0 0.7071
  [3,16,0,0,0,-0.3827,0,0.9239,-0.7071,0,0.7071],
// 3 16 0 0 0 -0.7071 0 0.7071 -0.9239 0 0.3827
  [3,16,0,0,0,-0.7071,0,0.7071,-0.9239,0,0.3827],
// 3 16 0 0 0 -0.9239 0 0.3827 -1 0 -0
  [3,16,0,0,0,-0.9239,0,0.3827,-1,0,-0],
// 3 16 0 0 0 -1 0 -0 -0.9239 0 -0.3827
  [3,16,0,0,0,-1,0,-0,-0.9239,0,-0.3827],
// 3 16 0 0 0 -0.9239 0 -0.3827 -0.7071 0 -0.7071
  [3,16,0,0,0,-0.9239,0,-0.3827,-0.7071,0,-0.7071],
// 3 16 0 0 0 -0.7071 0 -0.7071 -0.3827 0 -0.9239
  [3,16,0,0,0,-0.7071,0,-0.7071,-0.3827,0,-0.9239],
// 3 16 0 0 0 -0.3827 0 -0.9239 0 0 -1
  [3,16,0,0,0,-0.3827,0,-0.9239,0,0,-1],
// 3 16 0 0 0 0 0 -1 0.3827 0 -0.9239
  [3,16,0,0,0,0,0,-1,0.3827,0,-0.9239],
// 3 16 0 0 0 0.3827 0 -0.9239 0.7071 0 -0.7071
  [3,16,0,0,0,0.3827,0,-0.9239,0.7071,0,-0.7071],
// 3 16 0 0 0 0.7071 0 -0.7071 0.9239 0 -0.3827
  [3,16,0,0,0,0.7071,0,-0.7071,0.9239,0,-0.3827],
// 3 16 0 0 0 0.9239 0 -0.3827 1 0 0
  [3,16,0,0,0,0.9239,0,-0.3827,1,0,0],
// 0
];
module ldraw_lib__4_4disc(step=0, col=false, unit=2/5, alt=false, line=0.2, solid=!$preview)
    makepoly(ldraw_lib__4_4disc(), step=step, col=col, unit=unit, alt=alt, line=line, solid=solid);
ldraw_lib__4_4disc(line=0.2);
// main file
use <../lib.scad>
use <../p/4-4disc.scad>
use <../p/4-4ndis.scad>
use <s/3622s01.scad>
function ldraw_lib__3622px1() = [
// 0 Brick  1 x  3 with Face Black Eyes and Thin Smile Pattern
// 0 Name: 3622px1.dat
// 0 Author: Bert Van Raemdonck [BEAVeR]
// 0 !LDRAW_ORG Part UPDATE 2019-01
// 0 !LICENSE Licensed under CC BY 2.0 and CC BY 4.0 : see CAreadme.txt
// 
// 0 BFC CERTIFY CCW
  [0,"BFC","CERTIFY"],
  [0,"BFC","CCW"],
// 
// 0 !KEYWORDS Adventure Time, Bricklink 3622pb069, Princess Bubblegum
// 0 !KEYWORDS Rebrickable 3622pr0007, Set 21308
// 
// 0 !HISTORY 2019-06-28 [PTadmin] Official Update 2019-01
// 
// 
// 1 16 0 0 0 1 0 0 0 1 0 0 0 1 s\3622s01.dat
  [1,16,0,0,0,1,0,0,0,1,0,0,0,1, ldraw_lib__s__3622s01()],
// 
// 1 0 -15 10.3 -10 2.1 0 0 0 0 -2.1 0 1 0 4-4disc.dat
  [1,0,-15,10.3,-10,2.1,0,0,0,0,-2.1,0,1,0, ldraw_lib__4_4disc()],
// 1 0 15 10.3 -10 2.1 0 0 0 0 -2.1 0 1 0 4-4disc.dat
  [1,0,15,10.3,-10,2.1,0,0,0,0,-2.1,0,1,0, ldraw_lib__4_4disc()],
// 1 16 -15 10.3 -10 2.1 0 0 0 0 -2.1 0 1 0 4-4ndis.dat
  [1,16,-15,10.3,-10,2.1,0,0,0,0,-2.1,0,1,0, ldraw_lib__4_4ndis()],
// 1 16 15 10.3 -10 2.1 0 0 0 0 -2.1 0 1 0 4-4ndis.dat
  [1,16,15,10.3,-10,2.1,0,0,0,0,-2.1,0,1,0, ldraw_lib__4_4ndis()],
// 4 0 1.7 20.1 -10 0 20.2 -10 0 21.6 -10 1.9 21.4 -10
  [4,0,1.7,20.1,-10,0,20.2,-10,0,21.6,-10,1.9,21.4,-10],
// 4 0 3.3 19.9 -10 1.7 20.1 -10 1.9 21.4 -10 3.8 20.8 -10
  [4,0,3.3,19.9,-10,1.7,20.1,-10,1.9,21.4,-10,3.8,20.8,-10],
// 4 0 4.8 19.5 -10 3.3 19.9 -10 3.8 20.8 -10 5.5 19.9 -10
  [4,0,4.8,19.5,-10,3.3,19.9,-10,3.8,20.8,-10,5.5,19.9,-10],
// 4 0 6.2 18.8 -10 4.8 19.5 -10 5.5 19.9 -10 6.5 19.2 -10
  [4,0,6.2,18.8,-10,4.8,19.5,-10,5.5,19.9,-10,6.5,19.2,-10],
// 4 0 6.7 18.7 -10 6.2 18.8 -10 6.5 19.2 -10 6.8 18.9 -10
  [4,0,6.7,18.7,-10,6.2,18.8,-10,6.5,19.2,-10,6.8,18.9,-10],
// 4 0 0 21.6 -10 0 20.2 -10 -1.7 20.1 -10 -1.9 21.4 -10
  [4,0,0,21.6,-10,0,20.2,-10,-1.7,20.1,-10,-1.9,21.4,-10],
// 4 0 -1.9 21.4 -10 -1.7 20.1 -10 -3.3 19.9 -10 -3.8 20.8 -10
  [4,0,-1.9,21.4,-10,-1.7,20.1,-10,-3.3,19.9,-10,-3.8,20.8,-10],
// 4 0 -3.8 20.8 -10 -3.3 19.9 -10 -4.8 19.5 -10 -5.5 19.9 -10
  [4,0,-3.8,20.8,-10,-3.3,19.9,-10,-4.8,19.5,-10,-5.5,19.9,-10],
// 4 0 -5.5 19.9 -10 -4.8 19.5 -10 -6.2 18.8 -10 -6.5 19.2 -10
  [4,0,-5.5,19.9,-10,-4.8,19.5,-10,-6.2,18.8,-10,-6.5,19.2,-10],
// 4 0 -6.5 19.2 -10 -6.2 18.8 -10 -6.7 18.7 -10 -6.8 18.9 -10
  [4,0,-6.5,19.2,-10,-6.2,18.8,-10,-6.7,18.7,-10,-6.8,18.9,-10],
// 3 16 6.8 18.9 -10 6.5 19.2 -10 30 24 -10
  [3,16,6.8,18.9,-10,6.5,19.2,-10,30,24,-10],
// 3 16 6.5 19.2 -10 5.5 19.9 -10 30 24 -10
  [3,16,6.5,19.2,-10,5.5,19.9,-10,30,24,-10],
// 3 16 5.5 19.9 -10 3.8 20.8 -10 30 24 -10
  [3,16,5.5,19.9,-10,3.8,20.8,-10,30,24,-10],
// 3 16 3.8 20.8 -10 1.9 21.4 -10 30 24 -10
  [3,16,3.8,20.8,-10,1.9,21.4,-10,30,24,-10],
// 3 16 1.9 21.4 -10 0 21.6 -10 30 24 -10
  [3,16,1.9,21.4,-10,0,21.6,-10,30,24,-10],
// 3 16 0 21.6 -10 -30 24 -10 30 24 -10
  [3,16,0,21.6,-10,-30,24,-10,30,24,-10],
// 3 16 -1.9 21.4 -10 -30 24 -10 0 21.6 -10
  [3,16,-1.9,21.4,-10,-30,24,-10,0,21.6,-10],
// 3 16 -3.8 20.8 -10 -30 24 -10 -1.9 21.4 -10
  [3,16,-3.8,20.8,-10,-30,24,-10,-1.9,21.4,-10],
// 3 16 -5.5 19.9 -10 -30 24 -10 -3.8 20.8 -10
  [3,16,-5.5,19.9,-10,-30,24,-10,-3.8,20.8,-10],
// 3 16 -6.5 19.2 -10 -30 24 -10 -5.5 19.9 -10
  [3,16,-6.5,19.2,-10,-30,24,-10,-5.5,19.9,-10],
// 3 16 -6.8 18.9 -10 -30 24 -10 -6.5 19.2 -10
  [3,16,-6.8,18.9,-10,-30,24,-10,-6.5,19.2,-10],
// 4 16 -12.9 12.4 -10 -30 24 -10 -6.8 18.9 -10 -6.7 18.7 -10
  [4,16,-12.9,12.4,-10,-30,24,-10,-6.8,18.9,-10,-6.7,18.7,-10],
// 3 16 -30 0 -10 -17.1 10.3 -10 -17.1 8.2 -10
  [3,16,-30,0,-10,-17.1,10.3,-10,-17.1,8.2,-10],
// 4 16 -17.1 12.4 -10 -17.1 10.3 -10 -30 0 -10 -30 24 -10
  [4,16,-17.1,12.4,-10,-17.1,10.3,-10,-30,0,-10,-30,24,-10],
// 3 16 -30 0 -10 -17.1 8.2 -10 -15 8.2 -10
  [3,16,-30,0,-10,-17.1,8.2,-10,-15,8.2,-10],
// 3 16 -30 0 -10 -15 8.2 -10 -12.9 8.2 -10
  [3,16,-30,0,-10,-15,8.2,-10,-12.9,8.2,-10],
// 4 16 -12.9 12.4 -10 -6.7 18.7 -10 -6.2 18.8 -10 -12.9 10.3 -10
  [4,16,-12.9,12.4,-10,-6.7,18.7,-10,-6.2,18.8,-10,-12.9,10.3,-10],
// 4 16 -12.9 10.3 -10 -6.2 18.8 -10 -4.8 19.5 -10 -3.3 19.9 -10
  [4,16,-12.9,10.3,-10,-6.2,18.8,-10,-4.8,19.5,-10,-3.3,19.9,-10],
// 4 16 -3.3 19.9 -10 -1.7 20.1 -10 -12.9 8.2 -10 -12.9 10.3 -10
  [4,16,-3.3,19.9,-10,-1.7,20.1,-10,-12.9,8.2,-10,-12.9,10.3,-10],
// 3 16 -12.9 8.2 -10 -1.7 20.1 -10 0 20.2 -10
  [3,16,-12.9,8.2,-10,-1.7,20.1,-10,0,20.2,-10],
// 3 16 -15 12.4 -10 -17.1 12.4 -10 -30 24 -10
  [3,16,-15,12.4,-10,-17.1,12.4,-10,-30,24,-10],
// 3 16 -12.9 12.4 -10 -15 12.4 -10 -30 24 -10
  [3,16,-12.9,12.4,-10,-15,12.4,-10,-30,24,-10],
// 4 16 12.9 12.4 -10 6.7 18.7 -10 6.8 18.9 -10 30 24 -10
  [4,16,12.9,12.4,-10,6.7,18.7,-10,6.8,18.9,-10,30,24,-10],
// 4 16 6.2 18.8 -10 6.7 18.7 -10 12.9 12.4 -10 12.9 10.3 -10
  [4,16,6.2,18.8,-10,6.7,18.7,-10,12.9,12.4,-10,12.9,10.3,-10],
// 4 16 4.8 19.5 -10 6.2 18.8 -10 12.9 10.3 -10 3.3 19.9 -10
  [4,16,4.8,19.5,-10,6.2,18.8,-10,12.9,10.3,-10,3.3,19.9,-10],
// 4 16 3.3 19.9 -10 12.9 10.3 -10 12.9 8.2 -10 1.7 20.1 -10
  [4,16,3.3,19.9,-10,12.9,10.3,-10,12.9,8.2,-10,1.7,20.1,-10],
// 3 16 12.9 8.2 -10 0 20.2 -10 1.7 20.1 -10
  [3,16,12.9,8.2,-10,0,20.2,-10,1.7,20.1,-10],
// 3 16 12.9 8.2 -10 -12.9 8.2 -10 0 20.2 -10
  [3,16,12.9,8.2,-10,-12.9,8.2,-10,0,20.2,-10],
// 3 16 15 12.4 -10 12.9 12.4 -10 30 24 -10
  [3,16,15,12.4,-10,12.9,12.4,-10,30,24,-10],
// 3 16 17.1 12.4 -10 15 12.4 -10 30 24 -10
  [3,16,17.1,12.4,-10,15,12.4,-10,30,24,-10],
// 4 16 17.1 12.4 -10 30 24 -10 30 0 -10 17.1 10.3 -10
  [4,16,17.1,12.4,-10,30,24,-10,30,0,-10,17.1,10.3,-10],
// 3 16 30 0 -10 17.1 8.2 -10 17.1 10.3 -10
  [3,16,30,0,-10,17.1,8.2,-10,17.1,10.3,-10],
// 3 16 30 0 -10 15 8.2 -10 17.1 8.2 -10
  [3,16,30,0,-10,15,8.2,-10,17.1,8.2,-10],
// 3 16 30 0 -10 12.9 8.2 -10 15 8.2 -10
  [3,16,30,0,-10,12.9,8.2,-10,15,8.2,-10],
// 4 16 12.9 8.2 -10 30 0 -10 -30 0 -10 -12.9 8.2 -10
  [4,16,12.9,8.2,-10,30,0,-10,-30,0,-10,-12.9,8.2,-10],
];
module ldraw_lib__3622px1(step=0, col=false, unit=2/5, alt=false, line=0.2, solid=!$preview)
    makepoly(ldraw_lib__3622px1(), step=step, col=col, unit=unit, alt=alt, line=line, solid=solid);
ldraw_lib__3622px1(line=0.2);
